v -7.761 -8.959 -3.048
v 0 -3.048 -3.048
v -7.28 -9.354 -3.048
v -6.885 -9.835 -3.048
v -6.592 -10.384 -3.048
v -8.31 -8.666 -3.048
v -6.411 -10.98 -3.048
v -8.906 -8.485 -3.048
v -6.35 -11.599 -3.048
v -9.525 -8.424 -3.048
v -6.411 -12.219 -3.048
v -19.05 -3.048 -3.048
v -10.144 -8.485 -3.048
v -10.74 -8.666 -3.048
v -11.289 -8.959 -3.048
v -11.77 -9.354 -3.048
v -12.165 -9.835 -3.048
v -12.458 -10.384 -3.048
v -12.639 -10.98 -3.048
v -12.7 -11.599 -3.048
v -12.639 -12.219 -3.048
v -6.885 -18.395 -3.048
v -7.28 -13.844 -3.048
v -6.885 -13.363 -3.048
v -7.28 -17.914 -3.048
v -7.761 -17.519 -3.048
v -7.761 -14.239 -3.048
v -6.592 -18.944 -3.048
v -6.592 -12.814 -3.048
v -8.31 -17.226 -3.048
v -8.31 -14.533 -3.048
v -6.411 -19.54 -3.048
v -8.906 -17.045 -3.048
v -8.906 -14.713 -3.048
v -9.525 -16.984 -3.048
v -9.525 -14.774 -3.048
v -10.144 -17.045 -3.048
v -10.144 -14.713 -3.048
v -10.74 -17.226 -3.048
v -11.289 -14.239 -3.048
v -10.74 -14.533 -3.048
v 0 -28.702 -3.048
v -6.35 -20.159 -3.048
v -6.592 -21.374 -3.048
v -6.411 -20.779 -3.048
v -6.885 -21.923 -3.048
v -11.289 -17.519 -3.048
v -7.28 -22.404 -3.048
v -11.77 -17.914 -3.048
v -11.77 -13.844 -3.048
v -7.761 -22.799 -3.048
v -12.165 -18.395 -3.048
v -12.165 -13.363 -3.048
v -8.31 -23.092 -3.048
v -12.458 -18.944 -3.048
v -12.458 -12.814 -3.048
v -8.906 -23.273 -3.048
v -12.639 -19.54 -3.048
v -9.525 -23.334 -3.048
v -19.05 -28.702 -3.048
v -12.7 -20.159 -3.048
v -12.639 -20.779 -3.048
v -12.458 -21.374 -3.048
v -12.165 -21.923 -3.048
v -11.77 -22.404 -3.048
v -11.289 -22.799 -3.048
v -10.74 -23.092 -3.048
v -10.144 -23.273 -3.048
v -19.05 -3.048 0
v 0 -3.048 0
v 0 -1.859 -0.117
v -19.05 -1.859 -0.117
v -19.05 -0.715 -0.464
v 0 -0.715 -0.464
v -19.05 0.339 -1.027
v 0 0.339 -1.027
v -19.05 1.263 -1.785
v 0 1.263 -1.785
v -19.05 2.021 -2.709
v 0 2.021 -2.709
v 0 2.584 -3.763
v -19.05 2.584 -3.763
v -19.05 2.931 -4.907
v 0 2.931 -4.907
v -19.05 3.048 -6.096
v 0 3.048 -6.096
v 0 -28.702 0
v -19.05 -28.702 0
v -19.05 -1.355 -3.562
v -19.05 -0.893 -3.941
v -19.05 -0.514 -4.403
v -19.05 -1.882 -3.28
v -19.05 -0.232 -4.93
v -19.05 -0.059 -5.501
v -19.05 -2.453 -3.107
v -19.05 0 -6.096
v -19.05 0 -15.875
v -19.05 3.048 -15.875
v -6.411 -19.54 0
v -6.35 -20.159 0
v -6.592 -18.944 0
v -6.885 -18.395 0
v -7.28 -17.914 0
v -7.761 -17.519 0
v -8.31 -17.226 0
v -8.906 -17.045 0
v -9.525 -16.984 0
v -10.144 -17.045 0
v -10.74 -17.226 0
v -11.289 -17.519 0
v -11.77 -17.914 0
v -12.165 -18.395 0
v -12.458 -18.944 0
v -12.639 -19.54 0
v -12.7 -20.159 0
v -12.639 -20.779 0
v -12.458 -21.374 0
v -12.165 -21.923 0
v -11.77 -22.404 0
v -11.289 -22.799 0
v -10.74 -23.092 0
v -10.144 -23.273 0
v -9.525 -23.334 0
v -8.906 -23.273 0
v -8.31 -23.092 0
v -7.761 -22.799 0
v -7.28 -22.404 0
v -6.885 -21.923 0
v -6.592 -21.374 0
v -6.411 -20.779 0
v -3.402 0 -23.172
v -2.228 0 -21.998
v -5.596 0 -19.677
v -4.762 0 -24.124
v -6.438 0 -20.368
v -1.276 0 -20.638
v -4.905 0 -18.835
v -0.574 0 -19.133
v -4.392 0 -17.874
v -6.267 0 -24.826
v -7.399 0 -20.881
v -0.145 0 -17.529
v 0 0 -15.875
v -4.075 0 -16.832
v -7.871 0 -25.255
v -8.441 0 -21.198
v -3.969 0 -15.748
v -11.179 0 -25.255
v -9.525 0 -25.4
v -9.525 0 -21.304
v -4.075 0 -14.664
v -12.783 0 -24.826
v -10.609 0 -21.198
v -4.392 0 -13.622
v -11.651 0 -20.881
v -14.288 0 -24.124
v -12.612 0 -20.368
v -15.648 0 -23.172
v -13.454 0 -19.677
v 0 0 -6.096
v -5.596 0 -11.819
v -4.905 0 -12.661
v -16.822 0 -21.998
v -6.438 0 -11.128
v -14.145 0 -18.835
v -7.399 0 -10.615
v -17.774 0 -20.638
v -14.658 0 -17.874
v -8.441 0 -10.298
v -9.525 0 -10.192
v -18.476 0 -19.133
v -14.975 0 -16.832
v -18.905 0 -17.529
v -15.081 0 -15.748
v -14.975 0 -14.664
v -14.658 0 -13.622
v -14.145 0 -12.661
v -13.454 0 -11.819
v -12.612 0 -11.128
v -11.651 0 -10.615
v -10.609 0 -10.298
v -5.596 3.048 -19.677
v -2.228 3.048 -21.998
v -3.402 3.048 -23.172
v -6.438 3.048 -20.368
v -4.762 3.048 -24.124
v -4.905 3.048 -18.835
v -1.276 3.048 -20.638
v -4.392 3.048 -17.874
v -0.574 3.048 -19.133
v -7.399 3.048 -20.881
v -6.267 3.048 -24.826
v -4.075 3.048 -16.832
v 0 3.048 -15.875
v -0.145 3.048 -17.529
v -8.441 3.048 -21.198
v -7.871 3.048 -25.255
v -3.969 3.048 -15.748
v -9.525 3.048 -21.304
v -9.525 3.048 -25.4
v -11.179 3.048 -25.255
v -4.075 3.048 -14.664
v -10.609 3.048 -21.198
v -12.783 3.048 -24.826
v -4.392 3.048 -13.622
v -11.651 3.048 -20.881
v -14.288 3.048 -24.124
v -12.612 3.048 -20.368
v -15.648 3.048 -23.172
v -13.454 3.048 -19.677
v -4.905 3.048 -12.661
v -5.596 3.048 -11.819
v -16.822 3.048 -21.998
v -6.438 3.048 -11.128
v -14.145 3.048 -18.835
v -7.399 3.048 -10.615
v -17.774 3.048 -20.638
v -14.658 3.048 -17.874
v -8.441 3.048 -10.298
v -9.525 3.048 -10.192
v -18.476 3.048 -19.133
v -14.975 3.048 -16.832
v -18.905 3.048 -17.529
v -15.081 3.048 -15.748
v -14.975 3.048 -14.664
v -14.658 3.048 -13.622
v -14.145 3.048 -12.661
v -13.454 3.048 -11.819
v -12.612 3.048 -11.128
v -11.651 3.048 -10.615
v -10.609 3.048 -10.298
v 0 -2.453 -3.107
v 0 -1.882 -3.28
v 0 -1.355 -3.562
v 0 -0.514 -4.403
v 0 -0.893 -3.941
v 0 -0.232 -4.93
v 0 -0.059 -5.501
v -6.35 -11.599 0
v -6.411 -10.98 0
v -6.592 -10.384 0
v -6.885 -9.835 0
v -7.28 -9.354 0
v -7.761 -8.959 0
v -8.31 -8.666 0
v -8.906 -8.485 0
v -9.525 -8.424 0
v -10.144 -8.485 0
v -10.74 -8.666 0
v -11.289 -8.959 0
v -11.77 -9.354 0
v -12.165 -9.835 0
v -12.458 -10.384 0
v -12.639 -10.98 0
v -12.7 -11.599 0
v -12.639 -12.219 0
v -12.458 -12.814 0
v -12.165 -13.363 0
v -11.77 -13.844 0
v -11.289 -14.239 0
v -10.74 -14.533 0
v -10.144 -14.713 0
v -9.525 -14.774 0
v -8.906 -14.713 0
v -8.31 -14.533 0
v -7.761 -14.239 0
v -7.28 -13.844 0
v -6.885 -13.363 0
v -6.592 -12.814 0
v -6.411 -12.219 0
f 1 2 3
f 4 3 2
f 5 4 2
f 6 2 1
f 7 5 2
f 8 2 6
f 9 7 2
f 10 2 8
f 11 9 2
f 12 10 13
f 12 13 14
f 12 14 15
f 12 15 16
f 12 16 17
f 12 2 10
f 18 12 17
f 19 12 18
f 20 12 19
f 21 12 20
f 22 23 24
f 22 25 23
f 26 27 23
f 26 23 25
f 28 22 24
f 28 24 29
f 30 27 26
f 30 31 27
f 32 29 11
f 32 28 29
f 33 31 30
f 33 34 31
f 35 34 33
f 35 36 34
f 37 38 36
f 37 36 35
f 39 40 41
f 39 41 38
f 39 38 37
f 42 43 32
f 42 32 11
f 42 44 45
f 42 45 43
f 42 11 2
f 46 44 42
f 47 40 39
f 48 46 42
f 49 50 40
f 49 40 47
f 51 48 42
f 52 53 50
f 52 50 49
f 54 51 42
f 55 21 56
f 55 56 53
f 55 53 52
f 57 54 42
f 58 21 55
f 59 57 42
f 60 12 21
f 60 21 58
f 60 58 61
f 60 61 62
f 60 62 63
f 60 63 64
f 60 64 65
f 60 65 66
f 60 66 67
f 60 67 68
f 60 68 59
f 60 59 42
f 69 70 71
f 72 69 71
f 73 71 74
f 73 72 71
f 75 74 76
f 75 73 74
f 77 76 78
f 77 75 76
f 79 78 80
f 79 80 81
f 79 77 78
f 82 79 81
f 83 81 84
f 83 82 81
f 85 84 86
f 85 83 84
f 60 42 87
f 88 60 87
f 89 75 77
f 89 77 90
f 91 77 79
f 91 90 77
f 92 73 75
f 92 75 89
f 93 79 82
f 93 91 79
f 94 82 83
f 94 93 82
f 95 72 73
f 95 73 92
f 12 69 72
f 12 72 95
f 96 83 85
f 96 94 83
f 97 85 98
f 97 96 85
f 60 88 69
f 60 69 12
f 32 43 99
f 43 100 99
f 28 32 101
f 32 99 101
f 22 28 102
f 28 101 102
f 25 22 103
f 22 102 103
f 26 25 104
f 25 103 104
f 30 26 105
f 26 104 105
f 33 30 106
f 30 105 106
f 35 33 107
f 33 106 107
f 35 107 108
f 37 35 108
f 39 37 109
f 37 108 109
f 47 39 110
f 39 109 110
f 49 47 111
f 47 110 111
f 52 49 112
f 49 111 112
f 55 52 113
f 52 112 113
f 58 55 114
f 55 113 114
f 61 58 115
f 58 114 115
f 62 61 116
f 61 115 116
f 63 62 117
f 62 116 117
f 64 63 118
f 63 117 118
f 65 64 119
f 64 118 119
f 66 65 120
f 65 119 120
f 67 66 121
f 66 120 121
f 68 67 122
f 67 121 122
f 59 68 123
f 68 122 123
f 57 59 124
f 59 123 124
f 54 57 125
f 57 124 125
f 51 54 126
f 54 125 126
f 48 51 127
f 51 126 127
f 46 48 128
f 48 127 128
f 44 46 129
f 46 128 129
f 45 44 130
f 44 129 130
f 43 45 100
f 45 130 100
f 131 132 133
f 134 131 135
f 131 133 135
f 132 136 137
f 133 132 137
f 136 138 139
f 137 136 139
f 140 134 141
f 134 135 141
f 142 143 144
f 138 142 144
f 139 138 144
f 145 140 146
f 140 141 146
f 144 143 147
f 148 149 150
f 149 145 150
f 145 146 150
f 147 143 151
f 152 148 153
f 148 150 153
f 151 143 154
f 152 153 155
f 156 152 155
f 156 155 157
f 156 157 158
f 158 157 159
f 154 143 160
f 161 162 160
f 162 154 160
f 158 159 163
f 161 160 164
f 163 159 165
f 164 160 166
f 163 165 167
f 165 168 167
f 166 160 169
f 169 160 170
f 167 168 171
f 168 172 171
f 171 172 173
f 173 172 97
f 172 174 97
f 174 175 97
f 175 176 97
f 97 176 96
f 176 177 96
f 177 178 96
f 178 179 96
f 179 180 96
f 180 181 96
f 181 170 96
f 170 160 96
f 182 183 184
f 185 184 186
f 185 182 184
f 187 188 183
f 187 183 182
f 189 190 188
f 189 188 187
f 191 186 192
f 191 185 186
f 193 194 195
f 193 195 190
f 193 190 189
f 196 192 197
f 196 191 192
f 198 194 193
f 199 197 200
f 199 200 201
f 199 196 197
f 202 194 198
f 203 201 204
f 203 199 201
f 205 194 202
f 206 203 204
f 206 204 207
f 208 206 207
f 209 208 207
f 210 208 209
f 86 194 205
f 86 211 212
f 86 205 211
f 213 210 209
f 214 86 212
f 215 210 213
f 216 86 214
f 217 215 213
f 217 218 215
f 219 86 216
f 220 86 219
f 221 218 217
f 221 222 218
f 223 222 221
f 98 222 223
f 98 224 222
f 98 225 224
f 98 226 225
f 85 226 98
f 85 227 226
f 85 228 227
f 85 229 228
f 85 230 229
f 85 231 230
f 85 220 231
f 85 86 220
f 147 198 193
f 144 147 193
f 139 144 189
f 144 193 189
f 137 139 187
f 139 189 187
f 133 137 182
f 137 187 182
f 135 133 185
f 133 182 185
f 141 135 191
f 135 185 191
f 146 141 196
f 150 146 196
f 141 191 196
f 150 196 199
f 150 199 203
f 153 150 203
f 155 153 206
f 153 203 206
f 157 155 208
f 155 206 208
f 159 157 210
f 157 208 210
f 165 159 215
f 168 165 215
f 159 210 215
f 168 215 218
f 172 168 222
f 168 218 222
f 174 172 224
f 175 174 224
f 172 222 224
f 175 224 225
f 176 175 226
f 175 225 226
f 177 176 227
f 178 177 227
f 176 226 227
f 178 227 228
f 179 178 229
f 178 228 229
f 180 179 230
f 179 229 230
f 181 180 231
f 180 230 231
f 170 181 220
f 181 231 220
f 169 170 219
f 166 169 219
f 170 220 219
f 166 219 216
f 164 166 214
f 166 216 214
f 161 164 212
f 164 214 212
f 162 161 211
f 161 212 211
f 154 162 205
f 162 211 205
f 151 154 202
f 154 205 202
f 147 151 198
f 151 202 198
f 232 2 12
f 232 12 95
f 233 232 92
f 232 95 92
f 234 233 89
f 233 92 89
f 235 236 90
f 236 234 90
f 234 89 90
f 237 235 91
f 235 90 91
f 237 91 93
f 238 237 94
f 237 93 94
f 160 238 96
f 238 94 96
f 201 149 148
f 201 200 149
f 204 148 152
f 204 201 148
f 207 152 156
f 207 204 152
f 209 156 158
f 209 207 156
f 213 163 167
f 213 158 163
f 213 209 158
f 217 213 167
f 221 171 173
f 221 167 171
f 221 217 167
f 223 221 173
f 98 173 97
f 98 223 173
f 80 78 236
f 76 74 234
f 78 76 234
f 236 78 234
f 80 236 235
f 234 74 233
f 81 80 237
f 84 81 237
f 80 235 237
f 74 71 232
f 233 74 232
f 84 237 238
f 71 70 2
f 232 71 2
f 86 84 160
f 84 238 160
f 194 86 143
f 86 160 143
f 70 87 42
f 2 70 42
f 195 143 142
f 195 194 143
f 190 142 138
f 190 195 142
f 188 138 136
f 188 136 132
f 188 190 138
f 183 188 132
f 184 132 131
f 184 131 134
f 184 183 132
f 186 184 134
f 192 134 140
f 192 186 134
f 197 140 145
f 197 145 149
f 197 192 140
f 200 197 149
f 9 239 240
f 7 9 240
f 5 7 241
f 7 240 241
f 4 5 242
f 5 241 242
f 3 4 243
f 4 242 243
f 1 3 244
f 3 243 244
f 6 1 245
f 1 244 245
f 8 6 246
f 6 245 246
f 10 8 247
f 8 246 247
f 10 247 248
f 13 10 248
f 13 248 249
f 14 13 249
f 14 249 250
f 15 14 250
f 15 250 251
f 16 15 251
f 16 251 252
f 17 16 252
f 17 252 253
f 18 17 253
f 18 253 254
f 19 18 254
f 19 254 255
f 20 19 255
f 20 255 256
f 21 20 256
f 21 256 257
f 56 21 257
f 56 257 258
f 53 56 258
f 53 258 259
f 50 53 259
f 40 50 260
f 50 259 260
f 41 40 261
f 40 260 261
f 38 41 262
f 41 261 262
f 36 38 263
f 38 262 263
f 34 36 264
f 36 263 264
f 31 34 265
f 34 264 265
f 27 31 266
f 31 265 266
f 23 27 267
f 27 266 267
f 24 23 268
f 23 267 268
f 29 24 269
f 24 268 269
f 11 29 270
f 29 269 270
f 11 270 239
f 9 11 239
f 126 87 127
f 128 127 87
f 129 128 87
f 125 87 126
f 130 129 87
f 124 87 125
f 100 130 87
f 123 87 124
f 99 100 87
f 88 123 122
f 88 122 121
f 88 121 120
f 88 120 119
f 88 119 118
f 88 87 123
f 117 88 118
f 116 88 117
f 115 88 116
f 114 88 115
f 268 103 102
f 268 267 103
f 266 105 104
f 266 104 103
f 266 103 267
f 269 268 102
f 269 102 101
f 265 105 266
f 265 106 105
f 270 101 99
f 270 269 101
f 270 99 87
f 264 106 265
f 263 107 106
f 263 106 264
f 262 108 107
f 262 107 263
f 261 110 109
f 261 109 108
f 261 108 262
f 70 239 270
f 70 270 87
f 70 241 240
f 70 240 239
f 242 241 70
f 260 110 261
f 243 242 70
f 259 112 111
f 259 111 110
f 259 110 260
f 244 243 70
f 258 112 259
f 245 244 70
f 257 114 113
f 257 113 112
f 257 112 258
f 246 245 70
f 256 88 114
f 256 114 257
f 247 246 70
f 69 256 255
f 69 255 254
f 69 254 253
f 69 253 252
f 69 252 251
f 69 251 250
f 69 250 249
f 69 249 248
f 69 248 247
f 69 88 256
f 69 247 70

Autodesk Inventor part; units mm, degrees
ref_plane "YZ Plane" through (0, 0, 0) normal (1, 0, 0) x (0, 1, 0)
ref_plane "XZ Plane" through (0, 0, 0) normal (0, 1, 0) x (-1, 0, 0)
ref_plane "XY Plane" through (0, 0, 0) normal (0, 0, 1) x (1, 0, 0)
sketch "Sketch1" plane through (0, 0, 0) normal (0, 1, 0) x (-1, 0, 0)
  line L0 (0, 0) -> (19.05, 0)
  line L1 (19.05, 0) -> (19.05, -25.4)
  line L2 (19.05, -25.4) -> (0, -25.4)
  line L3 (0, -25.4) -> (0, 0)
  dimension "d0" = 25.4
  dimension "d1" = 19.05
extrude "Plate1" add sketch "Sketch1" along normal blind 3.048
sketch "Sketch2" plane through (-19.05, 3.048, -3.048) normal (0, 0, 1) x (1, 0, 0)
  line L0 (19.05, 0) -> (0, 0)
  line L1 (0, 0) -> (0, -31.75)
  line L2 (0, -31.75) -> (19.05, -31.75)
  line L3 (19.05, -31.75) -> (19.05, 0)
edge flange "Flange1" height 31.75 angle 90 thickness 3.048 bend radius 3.048 thickness toward (0, 0, 1) relief tear relief width 3.048 relief depth 1.524 edges at (-9.525, 0, 0) wall of the first edge with corners at (0, 3.048, -3.048) (-19.05, 3.048, -3.048) (-19.05, -28.702, -3.048) (0, -28.702, -3.048)
bend "Bend1"
corner "Corner1"
sketch "Sketch3" plane through (0, 3.048, 0) normal (0, 1, 0) x (1, 0, 0)
  line L0 (-19.05, 6.096) -> (-19.05, 25.4) projected
  line L1 (-19.05, 25.4) -> (0, 25.4) projected
  circle A0 centre (-9.525, 15.748) radius 5.5563
  point P0 (0, 0)
  dimension "d13" = 11.1125
extrude "Cut1" cut sketch "Sketch3" against normal blind 3.048
fillet "Corner Round1" radius 9.525 2 edges at (0, 1.524, -25.4) (-19.05, 1.524, -25.4)
sketch "Sketch5" plane through (-19.05, -28.702, 0) normal (0, 0, 1) x (1, 0, 0)
  line L0 (0, 0) -> (0, 25.654) projected
  line L1 (19.05, 0) -> (0, 0) projected
  line L2 (19.05, 25.654) -> (19.05, 0) projected
  line L3 (19.05, 25.654) -> (0, 25.654) projected
  line L4 (0, 25.654) -> (19.05, 25.654) projected
  line L5 (9.525, 25.654) -> (9.525, 17.1027)
  line L6 (9.525, 17.1027) -> (9.525, 8.5429)
  circle A0 centre (9.525, 17.1027) radius 3.175
  circle A1 centre (9.525, 8.5429) radius 3.175
  point P0 (19.05, 28.702)
  dimension "d17" = 8.5513
  dimension "d18" = 8.5598
  dimension "d19" = 6.35
  dimension "d20" = 6.35
extrude "Cut2" cut sketch "Sketch5" against normal blind 3.048 contours A0 L6 L5 | L5 L6 A0 | A1
equation "\"d14\" = Thickness"
equation "\"d21\" = Thickness"
equation "\"d3\" = BendReliefWidth"
equation "\"d4\" = BendReliefDepth"
equation "\"d5\" = MinimumRemnant"
equation "\"d6\" = BendRadius"
equation "\"d9\" = BendRadius"
equation "\"d10\" = CornerReliefSize"
equation "\"d11\" = GapSize"
equation "\"d12\" = JacobiRadiusSize"
equation "\"BendRadius\" = Thickness"
equation "\"BendReliefWidth\" = Thickness"
equation "\"BendReliefDepth\" = 0.5 * Thickness"
equation "\"CornerReliefSize\" = 4 * Thickness"
equation "\"MinimumRemnant\" = 2 * Thickness"
equation "\"TransitionRadius\" = BendRadius"
equation "\"JacobiRadiusSize\" = BendRadius"
equation "\"GapSize\" = Thickness"
equation "\"d2\" = BendRadius"
equation "\"Thickness\" = 3.048"
properties part number "RSL plate"
